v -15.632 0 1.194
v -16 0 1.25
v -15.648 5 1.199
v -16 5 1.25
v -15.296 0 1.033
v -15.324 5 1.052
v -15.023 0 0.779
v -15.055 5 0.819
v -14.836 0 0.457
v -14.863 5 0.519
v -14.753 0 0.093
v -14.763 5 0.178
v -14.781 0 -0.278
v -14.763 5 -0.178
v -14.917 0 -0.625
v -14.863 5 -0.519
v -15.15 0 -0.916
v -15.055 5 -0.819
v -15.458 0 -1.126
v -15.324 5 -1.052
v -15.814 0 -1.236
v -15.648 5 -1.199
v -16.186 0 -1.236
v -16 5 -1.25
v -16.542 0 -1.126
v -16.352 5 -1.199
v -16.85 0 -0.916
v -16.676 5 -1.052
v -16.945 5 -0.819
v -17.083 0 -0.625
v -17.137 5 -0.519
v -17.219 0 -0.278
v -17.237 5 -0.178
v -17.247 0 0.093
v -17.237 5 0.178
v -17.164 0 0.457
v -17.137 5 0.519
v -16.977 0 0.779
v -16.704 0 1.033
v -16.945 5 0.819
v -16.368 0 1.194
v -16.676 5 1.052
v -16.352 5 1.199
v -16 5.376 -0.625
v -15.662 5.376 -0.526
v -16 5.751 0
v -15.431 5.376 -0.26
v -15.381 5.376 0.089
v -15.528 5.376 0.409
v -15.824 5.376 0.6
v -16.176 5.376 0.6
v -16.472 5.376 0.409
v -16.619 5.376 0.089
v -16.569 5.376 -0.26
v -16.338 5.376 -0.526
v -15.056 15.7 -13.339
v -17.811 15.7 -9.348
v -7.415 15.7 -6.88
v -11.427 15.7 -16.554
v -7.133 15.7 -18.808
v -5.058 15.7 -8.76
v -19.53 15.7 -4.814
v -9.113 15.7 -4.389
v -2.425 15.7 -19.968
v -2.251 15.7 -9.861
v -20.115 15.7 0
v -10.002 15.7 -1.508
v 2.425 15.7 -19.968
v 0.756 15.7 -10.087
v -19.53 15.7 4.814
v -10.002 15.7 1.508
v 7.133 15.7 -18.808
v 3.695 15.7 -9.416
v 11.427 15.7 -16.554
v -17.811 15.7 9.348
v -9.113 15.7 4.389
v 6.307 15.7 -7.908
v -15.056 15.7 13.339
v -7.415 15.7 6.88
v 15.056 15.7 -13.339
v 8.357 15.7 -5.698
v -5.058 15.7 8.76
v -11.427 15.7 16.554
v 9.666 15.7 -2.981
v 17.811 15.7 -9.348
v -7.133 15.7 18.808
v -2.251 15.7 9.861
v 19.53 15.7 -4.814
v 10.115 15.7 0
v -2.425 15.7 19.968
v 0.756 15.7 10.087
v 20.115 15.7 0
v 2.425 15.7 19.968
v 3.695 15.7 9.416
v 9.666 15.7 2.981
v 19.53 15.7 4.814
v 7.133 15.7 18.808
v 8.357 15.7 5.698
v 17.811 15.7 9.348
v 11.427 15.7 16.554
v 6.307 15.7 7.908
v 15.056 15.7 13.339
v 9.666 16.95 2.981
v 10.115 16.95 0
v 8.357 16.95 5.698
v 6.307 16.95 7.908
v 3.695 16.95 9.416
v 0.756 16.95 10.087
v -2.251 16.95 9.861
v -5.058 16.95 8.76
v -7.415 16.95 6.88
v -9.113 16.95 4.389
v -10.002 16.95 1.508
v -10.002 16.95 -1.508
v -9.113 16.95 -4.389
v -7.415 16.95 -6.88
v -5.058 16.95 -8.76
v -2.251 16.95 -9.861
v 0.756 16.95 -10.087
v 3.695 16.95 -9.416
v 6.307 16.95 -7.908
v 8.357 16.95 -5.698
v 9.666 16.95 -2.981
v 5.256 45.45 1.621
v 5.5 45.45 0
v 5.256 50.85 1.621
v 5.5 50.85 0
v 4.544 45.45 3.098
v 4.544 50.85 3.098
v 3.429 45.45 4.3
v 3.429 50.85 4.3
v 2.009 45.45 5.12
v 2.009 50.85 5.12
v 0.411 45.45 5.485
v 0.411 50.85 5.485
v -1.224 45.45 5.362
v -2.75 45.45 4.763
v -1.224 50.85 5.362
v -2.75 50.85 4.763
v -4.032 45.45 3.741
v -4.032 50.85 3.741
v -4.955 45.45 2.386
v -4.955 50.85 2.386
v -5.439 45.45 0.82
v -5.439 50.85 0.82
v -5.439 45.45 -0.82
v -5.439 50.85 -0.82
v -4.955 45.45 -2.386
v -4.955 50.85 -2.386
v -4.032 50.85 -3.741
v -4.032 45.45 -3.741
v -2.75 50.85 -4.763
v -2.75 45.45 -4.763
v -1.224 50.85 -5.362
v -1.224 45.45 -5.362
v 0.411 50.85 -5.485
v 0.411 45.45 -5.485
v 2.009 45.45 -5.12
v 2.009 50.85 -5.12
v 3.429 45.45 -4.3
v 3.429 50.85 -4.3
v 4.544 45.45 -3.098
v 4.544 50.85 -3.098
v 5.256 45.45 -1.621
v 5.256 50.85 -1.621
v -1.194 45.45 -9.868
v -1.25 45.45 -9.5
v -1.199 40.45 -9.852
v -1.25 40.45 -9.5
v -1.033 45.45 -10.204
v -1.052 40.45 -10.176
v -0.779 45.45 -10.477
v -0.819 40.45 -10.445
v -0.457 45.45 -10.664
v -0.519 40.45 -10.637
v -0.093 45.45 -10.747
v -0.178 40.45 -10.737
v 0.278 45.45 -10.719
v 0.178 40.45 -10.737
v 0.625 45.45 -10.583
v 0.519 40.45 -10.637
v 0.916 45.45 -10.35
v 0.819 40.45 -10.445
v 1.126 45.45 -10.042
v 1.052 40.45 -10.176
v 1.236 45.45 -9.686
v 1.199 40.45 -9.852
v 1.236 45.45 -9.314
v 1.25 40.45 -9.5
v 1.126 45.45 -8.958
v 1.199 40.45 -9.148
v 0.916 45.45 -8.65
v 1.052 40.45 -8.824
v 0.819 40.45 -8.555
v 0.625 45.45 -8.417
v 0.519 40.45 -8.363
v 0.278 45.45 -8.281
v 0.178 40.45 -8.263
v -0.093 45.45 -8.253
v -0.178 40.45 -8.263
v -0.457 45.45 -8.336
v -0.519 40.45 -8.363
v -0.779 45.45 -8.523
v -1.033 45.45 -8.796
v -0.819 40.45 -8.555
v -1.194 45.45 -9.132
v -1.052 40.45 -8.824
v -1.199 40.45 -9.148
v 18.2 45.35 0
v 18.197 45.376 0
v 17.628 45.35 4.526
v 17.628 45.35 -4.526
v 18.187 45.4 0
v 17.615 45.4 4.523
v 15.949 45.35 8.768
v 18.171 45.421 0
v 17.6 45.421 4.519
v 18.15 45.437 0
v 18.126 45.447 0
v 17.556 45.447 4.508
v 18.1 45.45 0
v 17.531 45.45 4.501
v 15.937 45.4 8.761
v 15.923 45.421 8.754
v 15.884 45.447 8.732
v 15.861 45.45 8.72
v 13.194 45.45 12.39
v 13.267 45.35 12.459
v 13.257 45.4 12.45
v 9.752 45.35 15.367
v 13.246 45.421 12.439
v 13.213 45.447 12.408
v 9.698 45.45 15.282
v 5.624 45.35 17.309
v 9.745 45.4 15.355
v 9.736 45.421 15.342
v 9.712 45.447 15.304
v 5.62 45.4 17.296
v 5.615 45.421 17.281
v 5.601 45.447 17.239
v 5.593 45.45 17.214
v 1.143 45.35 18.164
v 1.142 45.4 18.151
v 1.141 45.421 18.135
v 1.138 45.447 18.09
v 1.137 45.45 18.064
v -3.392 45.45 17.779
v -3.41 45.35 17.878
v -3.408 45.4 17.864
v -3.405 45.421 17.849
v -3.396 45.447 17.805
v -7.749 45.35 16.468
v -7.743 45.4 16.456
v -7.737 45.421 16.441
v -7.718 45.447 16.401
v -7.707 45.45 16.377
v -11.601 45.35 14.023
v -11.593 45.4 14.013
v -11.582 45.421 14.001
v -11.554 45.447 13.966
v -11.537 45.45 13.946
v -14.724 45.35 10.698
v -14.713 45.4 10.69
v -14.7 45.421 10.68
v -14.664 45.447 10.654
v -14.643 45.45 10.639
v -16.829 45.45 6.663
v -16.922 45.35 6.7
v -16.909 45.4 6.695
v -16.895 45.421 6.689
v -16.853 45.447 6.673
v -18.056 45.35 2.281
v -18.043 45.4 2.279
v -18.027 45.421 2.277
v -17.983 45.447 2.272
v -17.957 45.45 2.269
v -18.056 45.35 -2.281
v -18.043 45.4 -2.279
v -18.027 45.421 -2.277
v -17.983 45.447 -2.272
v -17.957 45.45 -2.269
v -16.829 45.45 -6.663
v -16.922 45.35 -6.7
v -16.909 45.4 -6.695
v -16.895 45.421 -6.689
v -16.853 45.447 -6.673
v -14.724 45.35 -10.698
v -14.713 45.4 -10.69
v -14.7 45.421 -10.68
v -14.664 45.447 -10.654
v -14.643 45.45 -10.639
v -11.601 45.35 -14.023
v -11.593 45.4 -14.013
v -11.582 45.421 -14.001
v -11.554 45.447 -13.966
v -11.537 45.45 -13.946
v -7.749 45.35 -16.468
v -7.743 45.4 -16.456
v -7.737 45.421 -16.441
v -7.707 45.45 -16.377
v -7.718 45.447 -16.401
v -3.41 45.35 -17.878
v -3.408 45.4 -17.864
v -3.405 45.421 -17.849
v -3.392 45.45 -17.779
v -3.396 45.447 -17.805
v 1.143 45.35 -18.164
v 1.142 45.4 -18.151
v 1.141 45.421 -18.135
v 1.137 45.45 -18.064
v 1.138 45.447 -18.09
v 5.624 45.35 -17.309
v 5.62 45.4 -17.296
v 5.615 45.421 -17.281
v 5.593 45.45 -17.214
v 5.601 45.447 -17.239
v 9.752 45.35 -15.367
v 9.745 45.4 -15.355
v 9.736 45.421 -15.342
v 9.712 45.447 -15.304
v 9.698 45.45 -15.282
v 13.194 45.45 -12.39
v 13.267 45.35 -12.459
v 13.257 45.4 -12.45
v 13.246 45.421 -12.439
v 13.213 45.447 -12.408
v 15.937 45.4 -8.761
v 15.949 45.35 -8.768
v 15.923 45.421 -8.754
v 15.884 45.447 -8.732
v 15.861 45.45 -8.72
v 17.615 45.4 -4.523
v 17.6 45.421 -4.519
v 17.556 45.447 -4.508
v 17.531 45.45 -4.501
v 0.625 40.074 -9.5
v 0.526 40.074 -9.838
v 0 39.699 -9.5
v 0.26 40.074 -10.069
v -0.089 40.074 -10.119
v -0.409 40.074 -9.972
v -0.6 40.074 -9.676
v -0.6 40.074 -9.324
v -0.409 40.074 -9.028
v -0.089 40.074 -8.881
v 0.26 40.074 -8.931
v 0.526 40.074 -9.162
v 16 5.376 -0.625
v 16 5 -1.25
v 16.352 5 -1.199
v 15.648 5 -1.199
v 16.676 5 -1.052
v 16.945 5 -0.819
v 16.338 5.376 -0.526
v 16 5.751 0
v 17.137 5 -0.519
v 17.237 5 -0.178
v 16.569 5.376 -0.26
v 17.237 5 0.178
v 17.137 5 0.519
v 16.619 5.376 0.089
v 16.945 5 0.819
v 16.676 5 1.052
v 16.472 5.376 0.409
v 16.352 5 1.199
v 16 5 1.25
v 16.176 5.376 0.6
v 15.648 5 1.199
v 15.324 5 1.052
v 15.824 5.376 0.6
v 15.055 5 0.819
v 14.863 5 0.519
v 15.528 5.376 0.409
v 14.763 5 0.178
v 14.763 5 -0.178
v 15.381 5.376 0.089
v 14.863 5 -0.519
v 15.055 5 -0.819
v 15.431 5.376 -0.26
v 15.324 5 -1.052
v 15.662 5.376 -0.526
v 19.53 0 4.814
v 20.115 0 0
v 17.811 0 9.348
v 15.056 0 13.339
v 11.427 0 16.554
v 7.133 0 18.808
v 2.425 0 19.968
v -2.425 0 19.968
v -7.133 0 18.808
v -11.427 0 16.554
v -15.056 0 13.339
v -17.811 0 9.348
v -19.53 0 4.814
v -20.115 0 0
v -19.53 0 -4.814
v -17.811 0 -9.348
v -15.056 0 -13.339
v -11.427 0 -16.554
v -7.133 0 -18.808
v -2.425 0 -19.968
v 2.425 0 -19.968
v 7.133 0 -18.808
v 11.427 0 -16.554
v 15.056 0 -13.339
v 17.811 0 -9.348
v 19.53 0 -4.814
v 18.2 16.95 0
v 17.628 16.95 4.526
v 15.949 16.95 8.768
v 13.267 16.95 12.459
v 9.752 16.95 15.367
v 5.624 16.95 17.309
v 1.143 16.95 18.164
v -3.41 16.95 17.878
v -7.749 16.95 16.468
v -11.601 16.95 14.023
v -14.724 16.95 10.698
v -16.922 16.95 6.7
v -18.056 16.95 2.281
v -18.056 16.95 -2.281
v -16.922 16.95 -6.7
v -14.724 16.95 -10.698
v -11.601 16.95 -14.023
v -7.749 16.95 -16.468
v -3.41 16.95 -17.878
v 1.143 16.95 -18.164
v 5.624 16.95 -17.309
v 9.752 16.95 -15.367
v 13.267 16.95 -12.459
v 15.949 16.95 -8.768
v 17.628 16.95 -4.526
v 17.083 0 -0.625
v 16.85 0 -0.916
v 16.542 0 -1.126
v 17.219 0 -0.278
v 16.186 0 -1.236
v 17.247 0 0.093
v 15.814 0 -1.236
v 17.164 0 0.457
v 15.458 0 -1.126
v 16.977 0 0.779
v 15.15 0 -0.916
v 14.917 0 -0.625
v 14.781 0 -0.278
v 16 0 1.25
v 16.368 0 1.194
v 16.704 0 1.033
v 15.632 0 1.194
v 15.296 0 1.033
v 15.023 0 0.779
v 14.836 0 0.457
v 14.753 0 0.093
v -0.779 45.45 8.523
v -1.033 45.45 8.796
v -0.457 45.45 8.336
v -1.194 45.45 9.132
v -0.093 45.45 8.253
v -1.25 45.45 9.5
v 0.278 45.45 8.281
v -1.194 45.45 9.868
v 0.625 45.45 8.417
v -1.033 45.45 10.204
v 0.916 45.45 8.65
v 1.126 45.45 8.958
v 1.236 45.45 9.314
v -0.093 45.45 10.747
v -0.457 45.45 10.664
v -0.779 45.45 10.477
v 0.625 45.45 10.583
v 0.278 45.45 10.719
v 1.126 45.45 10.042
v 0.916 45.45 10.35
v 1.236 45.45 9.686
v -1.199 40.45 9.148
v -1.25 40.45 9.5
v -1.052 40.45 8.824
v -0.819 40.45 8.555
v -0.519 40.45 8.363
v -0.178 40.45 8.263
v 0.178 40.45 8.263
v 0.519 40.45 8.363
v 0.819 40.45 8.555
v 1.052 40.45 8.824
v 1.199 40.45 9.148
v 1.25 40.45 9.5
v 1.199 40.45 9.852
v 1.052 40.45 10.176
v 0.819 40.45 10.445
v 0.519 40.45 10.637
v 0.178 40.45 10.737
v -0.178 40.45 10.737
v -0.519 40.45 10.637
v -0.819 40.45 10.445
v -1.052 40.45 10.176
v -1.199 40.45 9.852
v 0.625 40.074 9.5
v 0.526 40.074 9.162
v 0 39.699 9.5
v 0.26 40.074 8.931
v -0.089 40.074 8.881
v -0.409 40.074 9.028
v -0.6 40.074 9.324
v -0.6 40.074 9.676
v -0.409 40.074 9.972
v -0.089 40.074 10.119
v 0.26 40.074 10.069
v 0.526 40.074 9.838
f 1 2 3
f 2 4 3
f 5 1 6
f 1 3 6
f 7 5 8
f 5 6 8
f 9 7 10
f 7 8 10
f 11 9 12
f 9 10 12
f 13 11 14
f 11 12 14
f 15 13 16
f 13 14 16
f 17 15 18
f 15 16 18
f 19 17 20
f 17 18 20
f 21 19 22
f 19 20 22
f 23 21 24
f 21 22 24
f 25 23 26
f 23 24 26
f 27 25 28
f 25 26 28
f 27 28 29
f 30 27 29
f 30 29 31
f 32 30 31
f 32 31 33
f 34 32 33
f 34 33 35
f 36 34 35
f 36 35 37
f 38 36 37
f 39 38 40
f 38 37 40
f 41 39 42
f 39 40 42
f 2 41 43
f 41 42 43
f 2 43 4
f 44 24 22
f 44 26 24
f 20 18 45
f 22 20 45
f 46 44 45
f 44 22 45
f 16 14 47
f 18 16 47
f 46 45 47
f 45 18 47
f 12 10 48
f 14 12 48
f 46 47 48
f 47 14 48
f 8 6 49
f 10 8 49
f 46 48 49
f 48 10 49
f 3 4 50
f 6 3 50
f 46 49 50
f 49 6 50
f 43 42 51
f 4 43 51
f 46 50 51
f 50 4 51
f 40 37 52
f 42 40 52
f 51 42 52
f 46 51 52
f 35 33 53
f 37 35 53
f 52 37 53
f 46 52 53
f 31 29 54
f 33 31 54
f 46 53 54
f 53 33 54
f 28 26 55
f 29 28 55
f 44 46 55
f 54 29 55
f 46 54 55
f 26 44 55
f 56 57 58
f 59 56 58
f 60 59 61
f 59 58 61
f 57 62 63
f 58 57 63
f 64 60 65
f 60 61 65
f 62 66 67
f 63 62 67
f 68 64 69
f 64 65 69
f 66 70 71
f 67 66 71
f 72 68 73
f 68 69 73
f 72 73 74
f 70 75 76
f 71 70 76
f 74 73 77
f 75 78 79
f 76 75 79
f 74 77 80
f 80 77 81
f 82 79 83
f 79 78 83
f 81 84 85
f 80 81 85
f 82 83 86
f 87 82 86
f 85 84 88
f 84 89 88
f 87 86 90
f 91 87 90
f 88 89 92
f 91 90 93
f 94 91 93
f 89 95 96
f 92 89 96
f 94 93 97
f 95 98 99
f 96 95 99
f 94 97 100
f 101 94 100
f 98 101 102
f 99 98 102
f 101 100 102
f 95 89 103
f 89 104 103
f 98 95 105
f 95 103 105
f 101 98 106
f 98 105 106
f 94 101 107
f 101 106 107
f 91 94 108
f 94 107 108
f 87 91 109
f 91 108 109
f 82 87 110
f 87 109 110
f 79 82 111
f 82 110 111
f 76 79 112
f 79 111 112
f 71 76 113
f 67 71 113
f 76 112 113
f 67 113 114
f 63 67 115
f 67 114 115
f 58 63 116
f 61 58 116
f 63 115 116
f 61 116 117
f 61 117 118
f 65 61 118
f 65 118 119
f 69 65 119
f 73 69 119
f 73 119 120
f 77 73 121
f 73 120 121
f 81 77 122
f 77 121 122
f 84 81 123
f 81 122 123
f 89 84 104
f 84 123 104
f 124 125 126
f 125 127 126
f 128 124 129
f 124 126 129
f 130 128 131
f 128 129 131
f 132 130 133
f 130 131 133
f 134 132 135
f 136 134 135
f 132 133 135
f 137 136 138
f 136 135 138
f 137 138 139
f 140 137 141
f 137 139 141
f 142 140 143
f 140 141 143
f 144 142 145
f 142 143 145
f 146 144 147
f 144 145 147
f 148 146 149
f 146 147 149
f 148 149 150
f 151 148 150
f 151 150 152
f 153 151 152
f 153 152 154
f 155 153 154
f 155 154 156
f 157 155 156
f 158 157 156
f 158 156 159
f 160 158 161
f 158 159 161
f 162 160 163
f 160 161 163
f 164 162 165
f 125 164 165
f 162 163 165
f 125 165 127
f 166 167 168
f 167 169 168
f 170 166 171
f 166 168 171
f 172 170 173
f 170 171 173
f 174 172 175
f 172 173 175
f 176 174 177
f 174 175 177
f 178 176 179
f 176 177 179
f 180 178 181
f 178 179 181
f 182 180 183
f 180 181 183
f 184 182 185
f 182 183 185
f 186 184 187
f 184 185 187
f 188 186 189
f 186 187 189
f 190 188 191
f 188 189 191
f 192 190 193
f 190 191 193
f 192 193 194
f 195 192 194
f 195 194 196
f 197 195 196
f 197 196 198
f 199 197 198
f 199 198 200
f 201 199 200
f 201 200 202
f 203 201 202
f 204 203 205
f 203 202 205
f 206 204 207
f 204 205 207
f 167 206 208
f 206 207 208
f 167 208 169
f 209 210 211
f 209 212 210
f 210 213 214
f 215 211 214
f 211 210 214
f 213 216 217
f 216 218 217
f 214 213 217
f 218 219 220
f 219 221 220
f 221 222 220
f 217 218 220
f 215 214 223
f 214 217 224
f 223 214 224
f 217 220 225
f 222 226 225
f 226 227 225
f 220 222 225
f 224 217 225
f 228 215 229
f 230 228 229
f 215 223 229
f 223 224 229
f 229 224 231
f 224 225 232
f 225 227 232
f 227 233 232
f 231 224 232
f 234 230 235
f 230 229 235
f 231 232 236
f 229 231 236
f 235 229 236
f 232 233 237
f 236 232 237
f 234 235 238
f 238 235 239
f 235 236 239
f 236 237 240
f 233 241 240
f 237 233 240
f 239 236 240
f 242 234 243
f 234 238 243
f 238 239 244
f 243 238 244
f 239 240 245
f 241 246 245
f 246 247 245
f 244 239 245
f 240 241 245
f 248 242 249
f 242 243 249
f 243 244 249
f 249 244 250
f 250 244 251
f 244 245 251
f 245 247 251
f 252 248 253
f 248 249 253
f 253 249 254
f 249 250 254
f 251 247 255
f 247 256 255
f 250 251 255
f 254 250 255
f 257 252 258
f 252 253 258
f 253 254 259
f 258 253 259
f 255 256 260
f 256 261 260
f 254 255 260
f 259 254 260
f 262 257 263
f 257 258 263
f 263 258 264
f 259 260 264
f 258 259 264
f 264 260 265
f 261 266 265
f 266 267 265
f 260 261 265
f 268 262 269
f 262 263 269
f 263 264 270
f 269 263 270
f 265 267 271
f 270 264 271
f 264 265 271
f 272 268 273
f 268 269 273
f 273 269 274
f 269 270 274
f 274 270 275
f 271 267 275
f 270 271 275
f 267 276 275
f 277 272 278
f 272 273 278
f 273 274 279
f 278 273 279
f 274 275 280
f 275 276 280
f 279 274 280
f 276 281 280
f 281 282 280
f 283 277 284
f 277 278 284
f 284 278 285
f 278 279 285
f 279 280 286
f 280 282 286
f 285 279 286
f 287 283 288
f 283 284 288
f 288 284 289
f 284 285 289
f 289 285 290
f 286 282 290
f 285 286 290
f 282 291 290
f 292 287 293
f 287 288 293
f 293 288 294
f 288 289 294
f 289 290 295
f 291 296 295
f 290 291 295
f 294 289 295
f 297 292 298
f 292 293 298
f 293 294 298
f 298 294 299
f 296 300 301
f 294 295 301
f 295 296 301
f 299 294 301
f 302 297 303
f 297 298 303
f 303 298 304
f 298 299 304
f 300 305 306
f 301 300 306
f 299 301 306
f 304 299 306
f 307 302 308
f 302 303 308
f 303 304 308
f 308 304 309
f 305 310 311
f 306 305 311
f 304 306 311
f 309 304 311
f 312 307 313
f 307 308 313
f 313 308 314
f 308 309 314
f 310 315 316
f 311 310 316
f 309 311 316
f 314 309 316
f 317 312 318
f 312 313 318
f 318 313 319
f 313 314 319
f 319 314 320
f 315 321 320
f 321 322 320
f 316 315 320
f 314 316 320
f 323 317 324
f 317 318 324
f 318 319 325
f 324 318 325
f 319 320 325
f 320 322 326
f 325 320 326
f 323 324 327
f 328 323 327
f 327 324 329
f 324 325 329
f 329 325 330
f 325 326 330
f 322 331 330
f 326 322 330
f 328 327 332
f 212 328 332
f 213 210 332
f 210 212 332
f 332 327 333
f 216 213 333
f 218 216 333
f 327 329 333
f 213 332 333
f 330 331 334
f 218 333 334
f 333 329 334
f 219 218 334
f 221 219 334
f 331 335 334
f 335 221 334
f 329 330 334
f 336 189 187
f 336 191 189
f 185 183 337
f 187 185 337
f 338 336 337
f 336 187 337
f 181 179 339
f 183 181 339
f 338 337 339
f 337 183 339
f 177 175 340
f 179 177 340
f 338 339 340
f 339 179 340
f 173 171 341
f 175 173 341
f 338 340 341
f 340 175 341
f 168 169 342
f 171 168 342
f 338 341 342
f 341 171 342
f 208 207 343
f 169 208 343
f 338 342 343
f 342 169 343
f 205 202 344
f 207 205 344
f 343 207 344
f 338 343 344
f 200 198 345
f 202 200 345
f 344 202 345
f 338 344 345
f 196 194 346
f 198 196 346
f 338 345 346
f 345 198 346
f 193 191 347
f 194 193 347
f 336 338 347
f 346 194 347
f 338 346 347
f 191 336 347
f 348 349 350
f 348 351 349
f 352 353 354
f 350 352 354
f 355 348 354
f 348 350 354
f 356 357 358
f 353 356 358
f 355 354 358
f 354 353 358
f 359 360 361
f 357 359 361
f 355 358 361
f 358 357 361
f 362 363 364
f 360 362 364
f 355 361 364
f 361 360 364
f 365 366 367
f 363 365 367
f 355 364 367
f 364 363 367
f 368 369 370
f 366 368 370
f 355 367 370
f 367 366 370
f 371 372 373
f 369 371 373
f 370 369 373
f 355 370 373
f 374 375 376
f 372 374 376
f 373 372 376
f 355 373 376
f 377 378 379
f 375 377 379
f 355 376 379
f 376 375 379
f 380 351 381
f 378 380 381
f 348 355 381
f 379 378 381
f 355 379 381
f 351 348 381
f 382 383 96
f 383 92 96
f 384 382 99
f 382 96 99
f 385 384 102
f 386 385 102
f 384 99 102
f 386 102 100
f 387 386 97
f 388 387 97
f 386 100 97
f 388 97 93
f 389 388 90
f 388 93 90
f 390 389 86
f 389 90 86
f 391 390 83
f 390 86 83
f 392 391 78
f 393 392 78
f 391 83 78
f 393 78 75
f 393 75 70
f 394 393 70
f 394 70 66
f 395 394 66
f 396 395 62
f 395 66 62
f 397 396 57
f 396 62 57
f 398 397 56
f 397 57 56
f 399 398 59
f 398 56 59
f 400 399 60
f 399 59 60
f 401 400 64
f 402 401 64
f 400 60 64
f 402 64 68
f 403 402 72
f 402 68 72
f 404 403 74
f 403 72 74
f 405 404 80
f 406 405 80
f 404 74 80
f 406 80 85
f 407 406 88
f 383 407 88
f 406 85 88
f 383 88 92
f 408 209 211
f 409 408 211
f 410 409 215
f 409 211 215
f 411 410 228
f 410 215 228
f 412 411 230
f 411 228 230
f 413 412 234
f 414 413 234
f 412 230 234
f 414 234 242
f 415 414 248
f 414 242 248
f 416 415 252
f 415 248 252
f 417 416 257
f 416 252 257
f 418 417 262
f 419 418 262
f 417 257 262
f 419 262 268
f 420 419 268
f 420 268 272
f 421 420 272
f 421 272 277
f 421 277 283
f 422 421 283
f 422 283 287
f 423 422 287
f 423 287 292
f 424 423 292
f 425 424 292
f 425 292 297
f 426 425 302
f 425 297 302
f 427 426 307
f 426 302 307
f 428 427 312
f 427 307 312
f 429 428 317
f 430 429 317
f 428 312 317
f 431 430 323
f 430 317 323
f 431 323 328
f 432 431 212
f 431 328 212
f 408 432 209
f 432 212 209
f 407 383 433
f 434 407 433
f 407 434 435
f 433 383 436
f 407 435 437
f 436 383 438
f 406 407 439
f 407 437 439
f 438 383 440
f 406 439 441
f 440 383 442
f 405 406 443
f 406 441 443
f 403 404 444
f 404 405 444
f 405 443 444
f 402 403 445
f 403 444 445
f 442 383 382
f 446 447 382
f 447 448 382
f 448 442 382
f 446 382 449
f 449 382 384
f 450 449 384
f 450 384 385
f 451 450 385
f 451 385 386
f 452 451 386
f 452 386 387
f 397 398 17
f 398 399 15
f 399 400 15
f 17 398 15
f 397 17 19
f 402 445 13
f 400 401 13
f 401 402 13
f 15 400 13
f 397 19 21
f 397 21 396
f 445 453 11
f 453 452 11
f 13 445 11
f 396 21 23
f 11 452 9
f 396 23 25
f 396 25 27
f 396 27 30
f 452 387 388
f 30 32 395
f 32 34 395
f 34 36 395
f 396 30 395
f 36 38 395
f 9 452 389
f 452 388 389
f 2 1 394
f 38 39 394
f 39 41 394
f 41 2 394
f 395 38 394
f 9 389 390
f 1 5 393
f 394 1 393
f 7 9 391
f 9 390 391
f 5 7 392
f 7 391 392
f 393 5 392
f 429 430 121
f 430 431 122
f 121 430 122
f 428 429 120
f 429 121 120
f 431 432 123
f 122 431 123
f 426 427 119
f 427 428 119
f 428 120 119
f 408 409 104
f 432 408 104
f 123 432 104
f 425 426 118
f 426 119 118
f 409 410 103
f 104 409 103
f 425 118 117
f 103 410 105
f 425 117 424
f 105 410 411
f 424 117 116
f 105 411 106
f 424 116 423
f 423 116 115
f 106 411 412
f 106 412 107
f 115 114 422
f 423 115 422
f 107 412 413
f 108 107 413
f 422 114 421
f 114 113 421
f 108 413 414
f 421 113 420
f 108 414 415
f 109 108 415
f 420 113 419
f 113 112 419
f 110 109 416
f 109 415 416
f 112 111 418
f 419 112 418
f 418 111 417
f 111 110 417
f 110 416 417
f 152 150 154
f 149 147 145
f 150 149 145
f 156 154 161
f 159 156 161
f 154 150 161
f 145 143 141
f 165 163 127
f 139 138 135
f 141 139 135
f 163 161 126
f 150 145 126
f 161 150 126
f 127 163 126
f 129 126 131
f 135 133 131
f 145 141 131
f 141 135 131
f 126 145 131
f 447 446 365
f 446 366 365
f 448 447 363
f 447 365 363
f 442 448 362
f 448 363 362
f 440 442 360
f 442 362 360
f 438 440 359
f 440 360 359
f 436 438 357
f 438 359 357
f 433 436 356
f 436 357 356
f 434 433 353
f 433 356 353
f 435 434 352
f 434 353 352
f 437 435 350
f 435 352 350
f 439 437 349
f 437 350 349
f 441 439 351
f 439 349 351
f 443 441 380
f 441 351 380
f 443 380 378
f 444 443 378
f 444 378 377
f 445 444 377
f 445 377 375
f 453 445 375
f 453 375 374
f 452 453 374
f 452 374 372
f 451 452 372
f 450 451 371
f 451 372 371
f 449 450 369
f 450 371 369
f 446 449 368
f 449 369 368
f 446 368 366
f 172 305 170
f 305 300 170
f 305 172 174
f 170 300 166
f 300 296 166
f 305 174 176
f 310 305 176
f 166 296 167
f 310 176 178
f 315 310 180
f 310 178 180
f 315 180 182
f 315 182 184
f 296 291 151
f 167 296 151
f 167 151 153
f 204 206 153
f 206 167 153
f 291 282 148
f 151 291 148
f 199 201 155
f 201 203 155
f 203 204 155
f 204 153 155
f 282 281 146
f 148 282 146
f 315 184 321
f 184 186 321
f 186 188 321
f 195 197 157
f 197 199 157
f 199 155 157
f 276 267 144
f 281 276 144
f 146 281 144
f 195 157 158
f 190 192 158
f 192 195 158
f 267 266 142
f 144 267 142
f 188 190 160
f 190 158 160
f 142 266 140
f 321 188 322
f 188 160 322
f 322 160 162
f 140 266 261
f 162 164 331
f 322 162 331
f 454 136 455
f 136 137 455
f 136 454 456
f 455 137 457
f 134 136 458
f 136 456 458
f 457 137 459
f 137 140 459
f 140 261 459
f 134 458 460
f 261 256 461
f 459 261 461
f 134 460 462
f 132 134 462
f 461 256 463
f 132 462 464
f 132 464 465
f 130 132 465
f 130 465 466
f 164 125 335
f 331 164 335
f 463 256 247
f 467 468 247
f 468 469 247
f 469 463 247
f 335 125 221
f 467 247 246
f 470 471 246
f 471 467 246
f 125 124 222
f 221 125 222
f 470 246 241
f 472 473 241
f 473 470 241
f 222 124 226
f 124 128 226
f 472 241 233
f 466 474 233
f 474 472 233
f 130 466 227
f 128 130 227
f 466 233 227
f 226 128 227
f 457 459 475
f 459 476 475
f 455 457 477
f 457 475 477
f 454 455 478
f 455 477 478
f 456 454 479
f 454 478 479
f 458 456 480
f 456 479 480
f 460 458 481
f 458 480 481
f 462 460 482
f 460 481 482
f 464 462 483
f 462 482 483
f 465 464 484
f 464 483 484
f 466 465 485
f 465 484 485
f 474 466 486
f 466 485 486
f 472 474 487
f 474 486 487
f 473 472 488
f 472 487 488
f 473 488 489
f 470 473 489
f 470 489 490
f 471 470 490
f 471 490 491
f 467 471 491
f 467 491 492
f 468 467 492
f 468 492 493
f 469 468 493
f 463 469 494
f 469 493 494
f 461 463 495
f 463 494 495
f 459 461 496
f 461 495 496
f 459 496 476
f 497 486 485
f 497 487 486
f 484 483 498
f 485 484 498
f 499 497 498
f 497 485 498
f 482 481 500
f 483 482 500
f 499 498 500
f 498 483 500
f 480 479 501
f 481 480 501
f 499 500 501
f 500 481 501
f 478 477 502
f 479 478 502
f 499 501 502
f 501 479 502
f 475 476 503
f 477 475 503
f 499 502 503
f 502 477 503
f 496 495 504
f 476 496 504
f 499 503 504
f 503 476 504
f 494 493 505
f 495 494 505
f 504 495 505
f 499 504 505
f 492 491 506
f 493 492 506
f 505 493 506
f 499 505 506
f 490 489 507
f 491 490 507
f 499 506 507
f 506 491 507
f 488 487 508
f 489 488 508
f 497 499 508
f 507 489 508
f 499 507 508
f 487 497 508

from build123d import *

# Parameters (mm, degrees)
M3X0_5_TAPPED_HOLE1_D               = 2.5
M3X0_5_TAPPED_HOLE1_DEPTH           = 5
M3X0_5_TAPPED_HOLE1_TIP             = 0.751075774
M3X0_5_TAPPED_HOLE1_ON_FACE_2_D     = 2.5
M3X0_5_TAPPED_HOLE1_ON_FACE_2_DEPTH = 5
M3X0_5_TAPPED_HOLE1_ON_FACE_2_TIP   = 0.751075774
FILLET1_R                           = 0.1


with BuildPart() as part:
    # Sketch1 → Revolve1 (revolve)
    with BuildSketch(Plane.XY):
        Polygon((0, 0), (20.115, 0), (20.115, 15.7), (10.115, 15.7), (10.115, 16.95), (18.2, 16.95), (18.2, 45.45), (5.5, 45.45), (5.5, 50.85), (0, 50.85), align=None)
    revolve(axis=Axis((0, 50.85, 0), (0, -1, 0)))

    # M3x0.5 Tapped Hole1
    with Locations(Plane(origin=(0, 45.45, -9.5), x_dir=(1, 0, 0), z_dir=(0, 1, 0))):
        with Locations((0, 0), (0, -19)):
            Hole(M3X0_5_TAPPED_HOLE1_D / 2, depth=M3X0_5_TAPPED_HOLE1_DEPTH)
            with Locations((0, 0, -(M3X0_5_TAPPED_HOLE1_DEPTH + M3X0_5_TAPPED_HOLE1_TIP / 2))):  # 118° drill point
                Cone(0, M3X0_5_TAPPED_HOLE1_D / 2, M3X0_5_TAPPED_HOLE1_TIP, mode=Mode.SUBTRACT)

    # M3x0.5 Tapped Hole1 on face 2
    with Locations(Plane(origin=(-16, 0, 0), x_dir=(0, 0, -1), z_dir=(0, -1, 0))):
        with Locations((0, 0), (0, 32)):
            Hole(M3X0_5_TAPPED_HOLE1_ON_FACE_2_D / 2, depth=M3X0_5_TAPPED_HOLE1_ON_FACE_2_DEPTH)
            with Locations((0, 0, -(M3X0_5_TAPPED_HOLE1_ON_FACE_2_DEPTH + M3X0_5_TAPPED_HOLE1_ON_FACE_2_TIP / 2))):  # 118° drill point
                Cone(0, M3X0_5_TAPPED_HOLE1_ON_FACE_2_D / 2, M3X0_5_TAPPED_HOLE1_ON_FACE_2_TIP, mode=Mode.SUBTRACT)

    # Fillet1
    fillet1_edges = [part.edges().sort_by_distance(p)[0] for p in [
        (-18.2, 45.45, 0),
    ]]
    fillet(fillet1_edges, radius=FILLET1_R)


solid = part.part
